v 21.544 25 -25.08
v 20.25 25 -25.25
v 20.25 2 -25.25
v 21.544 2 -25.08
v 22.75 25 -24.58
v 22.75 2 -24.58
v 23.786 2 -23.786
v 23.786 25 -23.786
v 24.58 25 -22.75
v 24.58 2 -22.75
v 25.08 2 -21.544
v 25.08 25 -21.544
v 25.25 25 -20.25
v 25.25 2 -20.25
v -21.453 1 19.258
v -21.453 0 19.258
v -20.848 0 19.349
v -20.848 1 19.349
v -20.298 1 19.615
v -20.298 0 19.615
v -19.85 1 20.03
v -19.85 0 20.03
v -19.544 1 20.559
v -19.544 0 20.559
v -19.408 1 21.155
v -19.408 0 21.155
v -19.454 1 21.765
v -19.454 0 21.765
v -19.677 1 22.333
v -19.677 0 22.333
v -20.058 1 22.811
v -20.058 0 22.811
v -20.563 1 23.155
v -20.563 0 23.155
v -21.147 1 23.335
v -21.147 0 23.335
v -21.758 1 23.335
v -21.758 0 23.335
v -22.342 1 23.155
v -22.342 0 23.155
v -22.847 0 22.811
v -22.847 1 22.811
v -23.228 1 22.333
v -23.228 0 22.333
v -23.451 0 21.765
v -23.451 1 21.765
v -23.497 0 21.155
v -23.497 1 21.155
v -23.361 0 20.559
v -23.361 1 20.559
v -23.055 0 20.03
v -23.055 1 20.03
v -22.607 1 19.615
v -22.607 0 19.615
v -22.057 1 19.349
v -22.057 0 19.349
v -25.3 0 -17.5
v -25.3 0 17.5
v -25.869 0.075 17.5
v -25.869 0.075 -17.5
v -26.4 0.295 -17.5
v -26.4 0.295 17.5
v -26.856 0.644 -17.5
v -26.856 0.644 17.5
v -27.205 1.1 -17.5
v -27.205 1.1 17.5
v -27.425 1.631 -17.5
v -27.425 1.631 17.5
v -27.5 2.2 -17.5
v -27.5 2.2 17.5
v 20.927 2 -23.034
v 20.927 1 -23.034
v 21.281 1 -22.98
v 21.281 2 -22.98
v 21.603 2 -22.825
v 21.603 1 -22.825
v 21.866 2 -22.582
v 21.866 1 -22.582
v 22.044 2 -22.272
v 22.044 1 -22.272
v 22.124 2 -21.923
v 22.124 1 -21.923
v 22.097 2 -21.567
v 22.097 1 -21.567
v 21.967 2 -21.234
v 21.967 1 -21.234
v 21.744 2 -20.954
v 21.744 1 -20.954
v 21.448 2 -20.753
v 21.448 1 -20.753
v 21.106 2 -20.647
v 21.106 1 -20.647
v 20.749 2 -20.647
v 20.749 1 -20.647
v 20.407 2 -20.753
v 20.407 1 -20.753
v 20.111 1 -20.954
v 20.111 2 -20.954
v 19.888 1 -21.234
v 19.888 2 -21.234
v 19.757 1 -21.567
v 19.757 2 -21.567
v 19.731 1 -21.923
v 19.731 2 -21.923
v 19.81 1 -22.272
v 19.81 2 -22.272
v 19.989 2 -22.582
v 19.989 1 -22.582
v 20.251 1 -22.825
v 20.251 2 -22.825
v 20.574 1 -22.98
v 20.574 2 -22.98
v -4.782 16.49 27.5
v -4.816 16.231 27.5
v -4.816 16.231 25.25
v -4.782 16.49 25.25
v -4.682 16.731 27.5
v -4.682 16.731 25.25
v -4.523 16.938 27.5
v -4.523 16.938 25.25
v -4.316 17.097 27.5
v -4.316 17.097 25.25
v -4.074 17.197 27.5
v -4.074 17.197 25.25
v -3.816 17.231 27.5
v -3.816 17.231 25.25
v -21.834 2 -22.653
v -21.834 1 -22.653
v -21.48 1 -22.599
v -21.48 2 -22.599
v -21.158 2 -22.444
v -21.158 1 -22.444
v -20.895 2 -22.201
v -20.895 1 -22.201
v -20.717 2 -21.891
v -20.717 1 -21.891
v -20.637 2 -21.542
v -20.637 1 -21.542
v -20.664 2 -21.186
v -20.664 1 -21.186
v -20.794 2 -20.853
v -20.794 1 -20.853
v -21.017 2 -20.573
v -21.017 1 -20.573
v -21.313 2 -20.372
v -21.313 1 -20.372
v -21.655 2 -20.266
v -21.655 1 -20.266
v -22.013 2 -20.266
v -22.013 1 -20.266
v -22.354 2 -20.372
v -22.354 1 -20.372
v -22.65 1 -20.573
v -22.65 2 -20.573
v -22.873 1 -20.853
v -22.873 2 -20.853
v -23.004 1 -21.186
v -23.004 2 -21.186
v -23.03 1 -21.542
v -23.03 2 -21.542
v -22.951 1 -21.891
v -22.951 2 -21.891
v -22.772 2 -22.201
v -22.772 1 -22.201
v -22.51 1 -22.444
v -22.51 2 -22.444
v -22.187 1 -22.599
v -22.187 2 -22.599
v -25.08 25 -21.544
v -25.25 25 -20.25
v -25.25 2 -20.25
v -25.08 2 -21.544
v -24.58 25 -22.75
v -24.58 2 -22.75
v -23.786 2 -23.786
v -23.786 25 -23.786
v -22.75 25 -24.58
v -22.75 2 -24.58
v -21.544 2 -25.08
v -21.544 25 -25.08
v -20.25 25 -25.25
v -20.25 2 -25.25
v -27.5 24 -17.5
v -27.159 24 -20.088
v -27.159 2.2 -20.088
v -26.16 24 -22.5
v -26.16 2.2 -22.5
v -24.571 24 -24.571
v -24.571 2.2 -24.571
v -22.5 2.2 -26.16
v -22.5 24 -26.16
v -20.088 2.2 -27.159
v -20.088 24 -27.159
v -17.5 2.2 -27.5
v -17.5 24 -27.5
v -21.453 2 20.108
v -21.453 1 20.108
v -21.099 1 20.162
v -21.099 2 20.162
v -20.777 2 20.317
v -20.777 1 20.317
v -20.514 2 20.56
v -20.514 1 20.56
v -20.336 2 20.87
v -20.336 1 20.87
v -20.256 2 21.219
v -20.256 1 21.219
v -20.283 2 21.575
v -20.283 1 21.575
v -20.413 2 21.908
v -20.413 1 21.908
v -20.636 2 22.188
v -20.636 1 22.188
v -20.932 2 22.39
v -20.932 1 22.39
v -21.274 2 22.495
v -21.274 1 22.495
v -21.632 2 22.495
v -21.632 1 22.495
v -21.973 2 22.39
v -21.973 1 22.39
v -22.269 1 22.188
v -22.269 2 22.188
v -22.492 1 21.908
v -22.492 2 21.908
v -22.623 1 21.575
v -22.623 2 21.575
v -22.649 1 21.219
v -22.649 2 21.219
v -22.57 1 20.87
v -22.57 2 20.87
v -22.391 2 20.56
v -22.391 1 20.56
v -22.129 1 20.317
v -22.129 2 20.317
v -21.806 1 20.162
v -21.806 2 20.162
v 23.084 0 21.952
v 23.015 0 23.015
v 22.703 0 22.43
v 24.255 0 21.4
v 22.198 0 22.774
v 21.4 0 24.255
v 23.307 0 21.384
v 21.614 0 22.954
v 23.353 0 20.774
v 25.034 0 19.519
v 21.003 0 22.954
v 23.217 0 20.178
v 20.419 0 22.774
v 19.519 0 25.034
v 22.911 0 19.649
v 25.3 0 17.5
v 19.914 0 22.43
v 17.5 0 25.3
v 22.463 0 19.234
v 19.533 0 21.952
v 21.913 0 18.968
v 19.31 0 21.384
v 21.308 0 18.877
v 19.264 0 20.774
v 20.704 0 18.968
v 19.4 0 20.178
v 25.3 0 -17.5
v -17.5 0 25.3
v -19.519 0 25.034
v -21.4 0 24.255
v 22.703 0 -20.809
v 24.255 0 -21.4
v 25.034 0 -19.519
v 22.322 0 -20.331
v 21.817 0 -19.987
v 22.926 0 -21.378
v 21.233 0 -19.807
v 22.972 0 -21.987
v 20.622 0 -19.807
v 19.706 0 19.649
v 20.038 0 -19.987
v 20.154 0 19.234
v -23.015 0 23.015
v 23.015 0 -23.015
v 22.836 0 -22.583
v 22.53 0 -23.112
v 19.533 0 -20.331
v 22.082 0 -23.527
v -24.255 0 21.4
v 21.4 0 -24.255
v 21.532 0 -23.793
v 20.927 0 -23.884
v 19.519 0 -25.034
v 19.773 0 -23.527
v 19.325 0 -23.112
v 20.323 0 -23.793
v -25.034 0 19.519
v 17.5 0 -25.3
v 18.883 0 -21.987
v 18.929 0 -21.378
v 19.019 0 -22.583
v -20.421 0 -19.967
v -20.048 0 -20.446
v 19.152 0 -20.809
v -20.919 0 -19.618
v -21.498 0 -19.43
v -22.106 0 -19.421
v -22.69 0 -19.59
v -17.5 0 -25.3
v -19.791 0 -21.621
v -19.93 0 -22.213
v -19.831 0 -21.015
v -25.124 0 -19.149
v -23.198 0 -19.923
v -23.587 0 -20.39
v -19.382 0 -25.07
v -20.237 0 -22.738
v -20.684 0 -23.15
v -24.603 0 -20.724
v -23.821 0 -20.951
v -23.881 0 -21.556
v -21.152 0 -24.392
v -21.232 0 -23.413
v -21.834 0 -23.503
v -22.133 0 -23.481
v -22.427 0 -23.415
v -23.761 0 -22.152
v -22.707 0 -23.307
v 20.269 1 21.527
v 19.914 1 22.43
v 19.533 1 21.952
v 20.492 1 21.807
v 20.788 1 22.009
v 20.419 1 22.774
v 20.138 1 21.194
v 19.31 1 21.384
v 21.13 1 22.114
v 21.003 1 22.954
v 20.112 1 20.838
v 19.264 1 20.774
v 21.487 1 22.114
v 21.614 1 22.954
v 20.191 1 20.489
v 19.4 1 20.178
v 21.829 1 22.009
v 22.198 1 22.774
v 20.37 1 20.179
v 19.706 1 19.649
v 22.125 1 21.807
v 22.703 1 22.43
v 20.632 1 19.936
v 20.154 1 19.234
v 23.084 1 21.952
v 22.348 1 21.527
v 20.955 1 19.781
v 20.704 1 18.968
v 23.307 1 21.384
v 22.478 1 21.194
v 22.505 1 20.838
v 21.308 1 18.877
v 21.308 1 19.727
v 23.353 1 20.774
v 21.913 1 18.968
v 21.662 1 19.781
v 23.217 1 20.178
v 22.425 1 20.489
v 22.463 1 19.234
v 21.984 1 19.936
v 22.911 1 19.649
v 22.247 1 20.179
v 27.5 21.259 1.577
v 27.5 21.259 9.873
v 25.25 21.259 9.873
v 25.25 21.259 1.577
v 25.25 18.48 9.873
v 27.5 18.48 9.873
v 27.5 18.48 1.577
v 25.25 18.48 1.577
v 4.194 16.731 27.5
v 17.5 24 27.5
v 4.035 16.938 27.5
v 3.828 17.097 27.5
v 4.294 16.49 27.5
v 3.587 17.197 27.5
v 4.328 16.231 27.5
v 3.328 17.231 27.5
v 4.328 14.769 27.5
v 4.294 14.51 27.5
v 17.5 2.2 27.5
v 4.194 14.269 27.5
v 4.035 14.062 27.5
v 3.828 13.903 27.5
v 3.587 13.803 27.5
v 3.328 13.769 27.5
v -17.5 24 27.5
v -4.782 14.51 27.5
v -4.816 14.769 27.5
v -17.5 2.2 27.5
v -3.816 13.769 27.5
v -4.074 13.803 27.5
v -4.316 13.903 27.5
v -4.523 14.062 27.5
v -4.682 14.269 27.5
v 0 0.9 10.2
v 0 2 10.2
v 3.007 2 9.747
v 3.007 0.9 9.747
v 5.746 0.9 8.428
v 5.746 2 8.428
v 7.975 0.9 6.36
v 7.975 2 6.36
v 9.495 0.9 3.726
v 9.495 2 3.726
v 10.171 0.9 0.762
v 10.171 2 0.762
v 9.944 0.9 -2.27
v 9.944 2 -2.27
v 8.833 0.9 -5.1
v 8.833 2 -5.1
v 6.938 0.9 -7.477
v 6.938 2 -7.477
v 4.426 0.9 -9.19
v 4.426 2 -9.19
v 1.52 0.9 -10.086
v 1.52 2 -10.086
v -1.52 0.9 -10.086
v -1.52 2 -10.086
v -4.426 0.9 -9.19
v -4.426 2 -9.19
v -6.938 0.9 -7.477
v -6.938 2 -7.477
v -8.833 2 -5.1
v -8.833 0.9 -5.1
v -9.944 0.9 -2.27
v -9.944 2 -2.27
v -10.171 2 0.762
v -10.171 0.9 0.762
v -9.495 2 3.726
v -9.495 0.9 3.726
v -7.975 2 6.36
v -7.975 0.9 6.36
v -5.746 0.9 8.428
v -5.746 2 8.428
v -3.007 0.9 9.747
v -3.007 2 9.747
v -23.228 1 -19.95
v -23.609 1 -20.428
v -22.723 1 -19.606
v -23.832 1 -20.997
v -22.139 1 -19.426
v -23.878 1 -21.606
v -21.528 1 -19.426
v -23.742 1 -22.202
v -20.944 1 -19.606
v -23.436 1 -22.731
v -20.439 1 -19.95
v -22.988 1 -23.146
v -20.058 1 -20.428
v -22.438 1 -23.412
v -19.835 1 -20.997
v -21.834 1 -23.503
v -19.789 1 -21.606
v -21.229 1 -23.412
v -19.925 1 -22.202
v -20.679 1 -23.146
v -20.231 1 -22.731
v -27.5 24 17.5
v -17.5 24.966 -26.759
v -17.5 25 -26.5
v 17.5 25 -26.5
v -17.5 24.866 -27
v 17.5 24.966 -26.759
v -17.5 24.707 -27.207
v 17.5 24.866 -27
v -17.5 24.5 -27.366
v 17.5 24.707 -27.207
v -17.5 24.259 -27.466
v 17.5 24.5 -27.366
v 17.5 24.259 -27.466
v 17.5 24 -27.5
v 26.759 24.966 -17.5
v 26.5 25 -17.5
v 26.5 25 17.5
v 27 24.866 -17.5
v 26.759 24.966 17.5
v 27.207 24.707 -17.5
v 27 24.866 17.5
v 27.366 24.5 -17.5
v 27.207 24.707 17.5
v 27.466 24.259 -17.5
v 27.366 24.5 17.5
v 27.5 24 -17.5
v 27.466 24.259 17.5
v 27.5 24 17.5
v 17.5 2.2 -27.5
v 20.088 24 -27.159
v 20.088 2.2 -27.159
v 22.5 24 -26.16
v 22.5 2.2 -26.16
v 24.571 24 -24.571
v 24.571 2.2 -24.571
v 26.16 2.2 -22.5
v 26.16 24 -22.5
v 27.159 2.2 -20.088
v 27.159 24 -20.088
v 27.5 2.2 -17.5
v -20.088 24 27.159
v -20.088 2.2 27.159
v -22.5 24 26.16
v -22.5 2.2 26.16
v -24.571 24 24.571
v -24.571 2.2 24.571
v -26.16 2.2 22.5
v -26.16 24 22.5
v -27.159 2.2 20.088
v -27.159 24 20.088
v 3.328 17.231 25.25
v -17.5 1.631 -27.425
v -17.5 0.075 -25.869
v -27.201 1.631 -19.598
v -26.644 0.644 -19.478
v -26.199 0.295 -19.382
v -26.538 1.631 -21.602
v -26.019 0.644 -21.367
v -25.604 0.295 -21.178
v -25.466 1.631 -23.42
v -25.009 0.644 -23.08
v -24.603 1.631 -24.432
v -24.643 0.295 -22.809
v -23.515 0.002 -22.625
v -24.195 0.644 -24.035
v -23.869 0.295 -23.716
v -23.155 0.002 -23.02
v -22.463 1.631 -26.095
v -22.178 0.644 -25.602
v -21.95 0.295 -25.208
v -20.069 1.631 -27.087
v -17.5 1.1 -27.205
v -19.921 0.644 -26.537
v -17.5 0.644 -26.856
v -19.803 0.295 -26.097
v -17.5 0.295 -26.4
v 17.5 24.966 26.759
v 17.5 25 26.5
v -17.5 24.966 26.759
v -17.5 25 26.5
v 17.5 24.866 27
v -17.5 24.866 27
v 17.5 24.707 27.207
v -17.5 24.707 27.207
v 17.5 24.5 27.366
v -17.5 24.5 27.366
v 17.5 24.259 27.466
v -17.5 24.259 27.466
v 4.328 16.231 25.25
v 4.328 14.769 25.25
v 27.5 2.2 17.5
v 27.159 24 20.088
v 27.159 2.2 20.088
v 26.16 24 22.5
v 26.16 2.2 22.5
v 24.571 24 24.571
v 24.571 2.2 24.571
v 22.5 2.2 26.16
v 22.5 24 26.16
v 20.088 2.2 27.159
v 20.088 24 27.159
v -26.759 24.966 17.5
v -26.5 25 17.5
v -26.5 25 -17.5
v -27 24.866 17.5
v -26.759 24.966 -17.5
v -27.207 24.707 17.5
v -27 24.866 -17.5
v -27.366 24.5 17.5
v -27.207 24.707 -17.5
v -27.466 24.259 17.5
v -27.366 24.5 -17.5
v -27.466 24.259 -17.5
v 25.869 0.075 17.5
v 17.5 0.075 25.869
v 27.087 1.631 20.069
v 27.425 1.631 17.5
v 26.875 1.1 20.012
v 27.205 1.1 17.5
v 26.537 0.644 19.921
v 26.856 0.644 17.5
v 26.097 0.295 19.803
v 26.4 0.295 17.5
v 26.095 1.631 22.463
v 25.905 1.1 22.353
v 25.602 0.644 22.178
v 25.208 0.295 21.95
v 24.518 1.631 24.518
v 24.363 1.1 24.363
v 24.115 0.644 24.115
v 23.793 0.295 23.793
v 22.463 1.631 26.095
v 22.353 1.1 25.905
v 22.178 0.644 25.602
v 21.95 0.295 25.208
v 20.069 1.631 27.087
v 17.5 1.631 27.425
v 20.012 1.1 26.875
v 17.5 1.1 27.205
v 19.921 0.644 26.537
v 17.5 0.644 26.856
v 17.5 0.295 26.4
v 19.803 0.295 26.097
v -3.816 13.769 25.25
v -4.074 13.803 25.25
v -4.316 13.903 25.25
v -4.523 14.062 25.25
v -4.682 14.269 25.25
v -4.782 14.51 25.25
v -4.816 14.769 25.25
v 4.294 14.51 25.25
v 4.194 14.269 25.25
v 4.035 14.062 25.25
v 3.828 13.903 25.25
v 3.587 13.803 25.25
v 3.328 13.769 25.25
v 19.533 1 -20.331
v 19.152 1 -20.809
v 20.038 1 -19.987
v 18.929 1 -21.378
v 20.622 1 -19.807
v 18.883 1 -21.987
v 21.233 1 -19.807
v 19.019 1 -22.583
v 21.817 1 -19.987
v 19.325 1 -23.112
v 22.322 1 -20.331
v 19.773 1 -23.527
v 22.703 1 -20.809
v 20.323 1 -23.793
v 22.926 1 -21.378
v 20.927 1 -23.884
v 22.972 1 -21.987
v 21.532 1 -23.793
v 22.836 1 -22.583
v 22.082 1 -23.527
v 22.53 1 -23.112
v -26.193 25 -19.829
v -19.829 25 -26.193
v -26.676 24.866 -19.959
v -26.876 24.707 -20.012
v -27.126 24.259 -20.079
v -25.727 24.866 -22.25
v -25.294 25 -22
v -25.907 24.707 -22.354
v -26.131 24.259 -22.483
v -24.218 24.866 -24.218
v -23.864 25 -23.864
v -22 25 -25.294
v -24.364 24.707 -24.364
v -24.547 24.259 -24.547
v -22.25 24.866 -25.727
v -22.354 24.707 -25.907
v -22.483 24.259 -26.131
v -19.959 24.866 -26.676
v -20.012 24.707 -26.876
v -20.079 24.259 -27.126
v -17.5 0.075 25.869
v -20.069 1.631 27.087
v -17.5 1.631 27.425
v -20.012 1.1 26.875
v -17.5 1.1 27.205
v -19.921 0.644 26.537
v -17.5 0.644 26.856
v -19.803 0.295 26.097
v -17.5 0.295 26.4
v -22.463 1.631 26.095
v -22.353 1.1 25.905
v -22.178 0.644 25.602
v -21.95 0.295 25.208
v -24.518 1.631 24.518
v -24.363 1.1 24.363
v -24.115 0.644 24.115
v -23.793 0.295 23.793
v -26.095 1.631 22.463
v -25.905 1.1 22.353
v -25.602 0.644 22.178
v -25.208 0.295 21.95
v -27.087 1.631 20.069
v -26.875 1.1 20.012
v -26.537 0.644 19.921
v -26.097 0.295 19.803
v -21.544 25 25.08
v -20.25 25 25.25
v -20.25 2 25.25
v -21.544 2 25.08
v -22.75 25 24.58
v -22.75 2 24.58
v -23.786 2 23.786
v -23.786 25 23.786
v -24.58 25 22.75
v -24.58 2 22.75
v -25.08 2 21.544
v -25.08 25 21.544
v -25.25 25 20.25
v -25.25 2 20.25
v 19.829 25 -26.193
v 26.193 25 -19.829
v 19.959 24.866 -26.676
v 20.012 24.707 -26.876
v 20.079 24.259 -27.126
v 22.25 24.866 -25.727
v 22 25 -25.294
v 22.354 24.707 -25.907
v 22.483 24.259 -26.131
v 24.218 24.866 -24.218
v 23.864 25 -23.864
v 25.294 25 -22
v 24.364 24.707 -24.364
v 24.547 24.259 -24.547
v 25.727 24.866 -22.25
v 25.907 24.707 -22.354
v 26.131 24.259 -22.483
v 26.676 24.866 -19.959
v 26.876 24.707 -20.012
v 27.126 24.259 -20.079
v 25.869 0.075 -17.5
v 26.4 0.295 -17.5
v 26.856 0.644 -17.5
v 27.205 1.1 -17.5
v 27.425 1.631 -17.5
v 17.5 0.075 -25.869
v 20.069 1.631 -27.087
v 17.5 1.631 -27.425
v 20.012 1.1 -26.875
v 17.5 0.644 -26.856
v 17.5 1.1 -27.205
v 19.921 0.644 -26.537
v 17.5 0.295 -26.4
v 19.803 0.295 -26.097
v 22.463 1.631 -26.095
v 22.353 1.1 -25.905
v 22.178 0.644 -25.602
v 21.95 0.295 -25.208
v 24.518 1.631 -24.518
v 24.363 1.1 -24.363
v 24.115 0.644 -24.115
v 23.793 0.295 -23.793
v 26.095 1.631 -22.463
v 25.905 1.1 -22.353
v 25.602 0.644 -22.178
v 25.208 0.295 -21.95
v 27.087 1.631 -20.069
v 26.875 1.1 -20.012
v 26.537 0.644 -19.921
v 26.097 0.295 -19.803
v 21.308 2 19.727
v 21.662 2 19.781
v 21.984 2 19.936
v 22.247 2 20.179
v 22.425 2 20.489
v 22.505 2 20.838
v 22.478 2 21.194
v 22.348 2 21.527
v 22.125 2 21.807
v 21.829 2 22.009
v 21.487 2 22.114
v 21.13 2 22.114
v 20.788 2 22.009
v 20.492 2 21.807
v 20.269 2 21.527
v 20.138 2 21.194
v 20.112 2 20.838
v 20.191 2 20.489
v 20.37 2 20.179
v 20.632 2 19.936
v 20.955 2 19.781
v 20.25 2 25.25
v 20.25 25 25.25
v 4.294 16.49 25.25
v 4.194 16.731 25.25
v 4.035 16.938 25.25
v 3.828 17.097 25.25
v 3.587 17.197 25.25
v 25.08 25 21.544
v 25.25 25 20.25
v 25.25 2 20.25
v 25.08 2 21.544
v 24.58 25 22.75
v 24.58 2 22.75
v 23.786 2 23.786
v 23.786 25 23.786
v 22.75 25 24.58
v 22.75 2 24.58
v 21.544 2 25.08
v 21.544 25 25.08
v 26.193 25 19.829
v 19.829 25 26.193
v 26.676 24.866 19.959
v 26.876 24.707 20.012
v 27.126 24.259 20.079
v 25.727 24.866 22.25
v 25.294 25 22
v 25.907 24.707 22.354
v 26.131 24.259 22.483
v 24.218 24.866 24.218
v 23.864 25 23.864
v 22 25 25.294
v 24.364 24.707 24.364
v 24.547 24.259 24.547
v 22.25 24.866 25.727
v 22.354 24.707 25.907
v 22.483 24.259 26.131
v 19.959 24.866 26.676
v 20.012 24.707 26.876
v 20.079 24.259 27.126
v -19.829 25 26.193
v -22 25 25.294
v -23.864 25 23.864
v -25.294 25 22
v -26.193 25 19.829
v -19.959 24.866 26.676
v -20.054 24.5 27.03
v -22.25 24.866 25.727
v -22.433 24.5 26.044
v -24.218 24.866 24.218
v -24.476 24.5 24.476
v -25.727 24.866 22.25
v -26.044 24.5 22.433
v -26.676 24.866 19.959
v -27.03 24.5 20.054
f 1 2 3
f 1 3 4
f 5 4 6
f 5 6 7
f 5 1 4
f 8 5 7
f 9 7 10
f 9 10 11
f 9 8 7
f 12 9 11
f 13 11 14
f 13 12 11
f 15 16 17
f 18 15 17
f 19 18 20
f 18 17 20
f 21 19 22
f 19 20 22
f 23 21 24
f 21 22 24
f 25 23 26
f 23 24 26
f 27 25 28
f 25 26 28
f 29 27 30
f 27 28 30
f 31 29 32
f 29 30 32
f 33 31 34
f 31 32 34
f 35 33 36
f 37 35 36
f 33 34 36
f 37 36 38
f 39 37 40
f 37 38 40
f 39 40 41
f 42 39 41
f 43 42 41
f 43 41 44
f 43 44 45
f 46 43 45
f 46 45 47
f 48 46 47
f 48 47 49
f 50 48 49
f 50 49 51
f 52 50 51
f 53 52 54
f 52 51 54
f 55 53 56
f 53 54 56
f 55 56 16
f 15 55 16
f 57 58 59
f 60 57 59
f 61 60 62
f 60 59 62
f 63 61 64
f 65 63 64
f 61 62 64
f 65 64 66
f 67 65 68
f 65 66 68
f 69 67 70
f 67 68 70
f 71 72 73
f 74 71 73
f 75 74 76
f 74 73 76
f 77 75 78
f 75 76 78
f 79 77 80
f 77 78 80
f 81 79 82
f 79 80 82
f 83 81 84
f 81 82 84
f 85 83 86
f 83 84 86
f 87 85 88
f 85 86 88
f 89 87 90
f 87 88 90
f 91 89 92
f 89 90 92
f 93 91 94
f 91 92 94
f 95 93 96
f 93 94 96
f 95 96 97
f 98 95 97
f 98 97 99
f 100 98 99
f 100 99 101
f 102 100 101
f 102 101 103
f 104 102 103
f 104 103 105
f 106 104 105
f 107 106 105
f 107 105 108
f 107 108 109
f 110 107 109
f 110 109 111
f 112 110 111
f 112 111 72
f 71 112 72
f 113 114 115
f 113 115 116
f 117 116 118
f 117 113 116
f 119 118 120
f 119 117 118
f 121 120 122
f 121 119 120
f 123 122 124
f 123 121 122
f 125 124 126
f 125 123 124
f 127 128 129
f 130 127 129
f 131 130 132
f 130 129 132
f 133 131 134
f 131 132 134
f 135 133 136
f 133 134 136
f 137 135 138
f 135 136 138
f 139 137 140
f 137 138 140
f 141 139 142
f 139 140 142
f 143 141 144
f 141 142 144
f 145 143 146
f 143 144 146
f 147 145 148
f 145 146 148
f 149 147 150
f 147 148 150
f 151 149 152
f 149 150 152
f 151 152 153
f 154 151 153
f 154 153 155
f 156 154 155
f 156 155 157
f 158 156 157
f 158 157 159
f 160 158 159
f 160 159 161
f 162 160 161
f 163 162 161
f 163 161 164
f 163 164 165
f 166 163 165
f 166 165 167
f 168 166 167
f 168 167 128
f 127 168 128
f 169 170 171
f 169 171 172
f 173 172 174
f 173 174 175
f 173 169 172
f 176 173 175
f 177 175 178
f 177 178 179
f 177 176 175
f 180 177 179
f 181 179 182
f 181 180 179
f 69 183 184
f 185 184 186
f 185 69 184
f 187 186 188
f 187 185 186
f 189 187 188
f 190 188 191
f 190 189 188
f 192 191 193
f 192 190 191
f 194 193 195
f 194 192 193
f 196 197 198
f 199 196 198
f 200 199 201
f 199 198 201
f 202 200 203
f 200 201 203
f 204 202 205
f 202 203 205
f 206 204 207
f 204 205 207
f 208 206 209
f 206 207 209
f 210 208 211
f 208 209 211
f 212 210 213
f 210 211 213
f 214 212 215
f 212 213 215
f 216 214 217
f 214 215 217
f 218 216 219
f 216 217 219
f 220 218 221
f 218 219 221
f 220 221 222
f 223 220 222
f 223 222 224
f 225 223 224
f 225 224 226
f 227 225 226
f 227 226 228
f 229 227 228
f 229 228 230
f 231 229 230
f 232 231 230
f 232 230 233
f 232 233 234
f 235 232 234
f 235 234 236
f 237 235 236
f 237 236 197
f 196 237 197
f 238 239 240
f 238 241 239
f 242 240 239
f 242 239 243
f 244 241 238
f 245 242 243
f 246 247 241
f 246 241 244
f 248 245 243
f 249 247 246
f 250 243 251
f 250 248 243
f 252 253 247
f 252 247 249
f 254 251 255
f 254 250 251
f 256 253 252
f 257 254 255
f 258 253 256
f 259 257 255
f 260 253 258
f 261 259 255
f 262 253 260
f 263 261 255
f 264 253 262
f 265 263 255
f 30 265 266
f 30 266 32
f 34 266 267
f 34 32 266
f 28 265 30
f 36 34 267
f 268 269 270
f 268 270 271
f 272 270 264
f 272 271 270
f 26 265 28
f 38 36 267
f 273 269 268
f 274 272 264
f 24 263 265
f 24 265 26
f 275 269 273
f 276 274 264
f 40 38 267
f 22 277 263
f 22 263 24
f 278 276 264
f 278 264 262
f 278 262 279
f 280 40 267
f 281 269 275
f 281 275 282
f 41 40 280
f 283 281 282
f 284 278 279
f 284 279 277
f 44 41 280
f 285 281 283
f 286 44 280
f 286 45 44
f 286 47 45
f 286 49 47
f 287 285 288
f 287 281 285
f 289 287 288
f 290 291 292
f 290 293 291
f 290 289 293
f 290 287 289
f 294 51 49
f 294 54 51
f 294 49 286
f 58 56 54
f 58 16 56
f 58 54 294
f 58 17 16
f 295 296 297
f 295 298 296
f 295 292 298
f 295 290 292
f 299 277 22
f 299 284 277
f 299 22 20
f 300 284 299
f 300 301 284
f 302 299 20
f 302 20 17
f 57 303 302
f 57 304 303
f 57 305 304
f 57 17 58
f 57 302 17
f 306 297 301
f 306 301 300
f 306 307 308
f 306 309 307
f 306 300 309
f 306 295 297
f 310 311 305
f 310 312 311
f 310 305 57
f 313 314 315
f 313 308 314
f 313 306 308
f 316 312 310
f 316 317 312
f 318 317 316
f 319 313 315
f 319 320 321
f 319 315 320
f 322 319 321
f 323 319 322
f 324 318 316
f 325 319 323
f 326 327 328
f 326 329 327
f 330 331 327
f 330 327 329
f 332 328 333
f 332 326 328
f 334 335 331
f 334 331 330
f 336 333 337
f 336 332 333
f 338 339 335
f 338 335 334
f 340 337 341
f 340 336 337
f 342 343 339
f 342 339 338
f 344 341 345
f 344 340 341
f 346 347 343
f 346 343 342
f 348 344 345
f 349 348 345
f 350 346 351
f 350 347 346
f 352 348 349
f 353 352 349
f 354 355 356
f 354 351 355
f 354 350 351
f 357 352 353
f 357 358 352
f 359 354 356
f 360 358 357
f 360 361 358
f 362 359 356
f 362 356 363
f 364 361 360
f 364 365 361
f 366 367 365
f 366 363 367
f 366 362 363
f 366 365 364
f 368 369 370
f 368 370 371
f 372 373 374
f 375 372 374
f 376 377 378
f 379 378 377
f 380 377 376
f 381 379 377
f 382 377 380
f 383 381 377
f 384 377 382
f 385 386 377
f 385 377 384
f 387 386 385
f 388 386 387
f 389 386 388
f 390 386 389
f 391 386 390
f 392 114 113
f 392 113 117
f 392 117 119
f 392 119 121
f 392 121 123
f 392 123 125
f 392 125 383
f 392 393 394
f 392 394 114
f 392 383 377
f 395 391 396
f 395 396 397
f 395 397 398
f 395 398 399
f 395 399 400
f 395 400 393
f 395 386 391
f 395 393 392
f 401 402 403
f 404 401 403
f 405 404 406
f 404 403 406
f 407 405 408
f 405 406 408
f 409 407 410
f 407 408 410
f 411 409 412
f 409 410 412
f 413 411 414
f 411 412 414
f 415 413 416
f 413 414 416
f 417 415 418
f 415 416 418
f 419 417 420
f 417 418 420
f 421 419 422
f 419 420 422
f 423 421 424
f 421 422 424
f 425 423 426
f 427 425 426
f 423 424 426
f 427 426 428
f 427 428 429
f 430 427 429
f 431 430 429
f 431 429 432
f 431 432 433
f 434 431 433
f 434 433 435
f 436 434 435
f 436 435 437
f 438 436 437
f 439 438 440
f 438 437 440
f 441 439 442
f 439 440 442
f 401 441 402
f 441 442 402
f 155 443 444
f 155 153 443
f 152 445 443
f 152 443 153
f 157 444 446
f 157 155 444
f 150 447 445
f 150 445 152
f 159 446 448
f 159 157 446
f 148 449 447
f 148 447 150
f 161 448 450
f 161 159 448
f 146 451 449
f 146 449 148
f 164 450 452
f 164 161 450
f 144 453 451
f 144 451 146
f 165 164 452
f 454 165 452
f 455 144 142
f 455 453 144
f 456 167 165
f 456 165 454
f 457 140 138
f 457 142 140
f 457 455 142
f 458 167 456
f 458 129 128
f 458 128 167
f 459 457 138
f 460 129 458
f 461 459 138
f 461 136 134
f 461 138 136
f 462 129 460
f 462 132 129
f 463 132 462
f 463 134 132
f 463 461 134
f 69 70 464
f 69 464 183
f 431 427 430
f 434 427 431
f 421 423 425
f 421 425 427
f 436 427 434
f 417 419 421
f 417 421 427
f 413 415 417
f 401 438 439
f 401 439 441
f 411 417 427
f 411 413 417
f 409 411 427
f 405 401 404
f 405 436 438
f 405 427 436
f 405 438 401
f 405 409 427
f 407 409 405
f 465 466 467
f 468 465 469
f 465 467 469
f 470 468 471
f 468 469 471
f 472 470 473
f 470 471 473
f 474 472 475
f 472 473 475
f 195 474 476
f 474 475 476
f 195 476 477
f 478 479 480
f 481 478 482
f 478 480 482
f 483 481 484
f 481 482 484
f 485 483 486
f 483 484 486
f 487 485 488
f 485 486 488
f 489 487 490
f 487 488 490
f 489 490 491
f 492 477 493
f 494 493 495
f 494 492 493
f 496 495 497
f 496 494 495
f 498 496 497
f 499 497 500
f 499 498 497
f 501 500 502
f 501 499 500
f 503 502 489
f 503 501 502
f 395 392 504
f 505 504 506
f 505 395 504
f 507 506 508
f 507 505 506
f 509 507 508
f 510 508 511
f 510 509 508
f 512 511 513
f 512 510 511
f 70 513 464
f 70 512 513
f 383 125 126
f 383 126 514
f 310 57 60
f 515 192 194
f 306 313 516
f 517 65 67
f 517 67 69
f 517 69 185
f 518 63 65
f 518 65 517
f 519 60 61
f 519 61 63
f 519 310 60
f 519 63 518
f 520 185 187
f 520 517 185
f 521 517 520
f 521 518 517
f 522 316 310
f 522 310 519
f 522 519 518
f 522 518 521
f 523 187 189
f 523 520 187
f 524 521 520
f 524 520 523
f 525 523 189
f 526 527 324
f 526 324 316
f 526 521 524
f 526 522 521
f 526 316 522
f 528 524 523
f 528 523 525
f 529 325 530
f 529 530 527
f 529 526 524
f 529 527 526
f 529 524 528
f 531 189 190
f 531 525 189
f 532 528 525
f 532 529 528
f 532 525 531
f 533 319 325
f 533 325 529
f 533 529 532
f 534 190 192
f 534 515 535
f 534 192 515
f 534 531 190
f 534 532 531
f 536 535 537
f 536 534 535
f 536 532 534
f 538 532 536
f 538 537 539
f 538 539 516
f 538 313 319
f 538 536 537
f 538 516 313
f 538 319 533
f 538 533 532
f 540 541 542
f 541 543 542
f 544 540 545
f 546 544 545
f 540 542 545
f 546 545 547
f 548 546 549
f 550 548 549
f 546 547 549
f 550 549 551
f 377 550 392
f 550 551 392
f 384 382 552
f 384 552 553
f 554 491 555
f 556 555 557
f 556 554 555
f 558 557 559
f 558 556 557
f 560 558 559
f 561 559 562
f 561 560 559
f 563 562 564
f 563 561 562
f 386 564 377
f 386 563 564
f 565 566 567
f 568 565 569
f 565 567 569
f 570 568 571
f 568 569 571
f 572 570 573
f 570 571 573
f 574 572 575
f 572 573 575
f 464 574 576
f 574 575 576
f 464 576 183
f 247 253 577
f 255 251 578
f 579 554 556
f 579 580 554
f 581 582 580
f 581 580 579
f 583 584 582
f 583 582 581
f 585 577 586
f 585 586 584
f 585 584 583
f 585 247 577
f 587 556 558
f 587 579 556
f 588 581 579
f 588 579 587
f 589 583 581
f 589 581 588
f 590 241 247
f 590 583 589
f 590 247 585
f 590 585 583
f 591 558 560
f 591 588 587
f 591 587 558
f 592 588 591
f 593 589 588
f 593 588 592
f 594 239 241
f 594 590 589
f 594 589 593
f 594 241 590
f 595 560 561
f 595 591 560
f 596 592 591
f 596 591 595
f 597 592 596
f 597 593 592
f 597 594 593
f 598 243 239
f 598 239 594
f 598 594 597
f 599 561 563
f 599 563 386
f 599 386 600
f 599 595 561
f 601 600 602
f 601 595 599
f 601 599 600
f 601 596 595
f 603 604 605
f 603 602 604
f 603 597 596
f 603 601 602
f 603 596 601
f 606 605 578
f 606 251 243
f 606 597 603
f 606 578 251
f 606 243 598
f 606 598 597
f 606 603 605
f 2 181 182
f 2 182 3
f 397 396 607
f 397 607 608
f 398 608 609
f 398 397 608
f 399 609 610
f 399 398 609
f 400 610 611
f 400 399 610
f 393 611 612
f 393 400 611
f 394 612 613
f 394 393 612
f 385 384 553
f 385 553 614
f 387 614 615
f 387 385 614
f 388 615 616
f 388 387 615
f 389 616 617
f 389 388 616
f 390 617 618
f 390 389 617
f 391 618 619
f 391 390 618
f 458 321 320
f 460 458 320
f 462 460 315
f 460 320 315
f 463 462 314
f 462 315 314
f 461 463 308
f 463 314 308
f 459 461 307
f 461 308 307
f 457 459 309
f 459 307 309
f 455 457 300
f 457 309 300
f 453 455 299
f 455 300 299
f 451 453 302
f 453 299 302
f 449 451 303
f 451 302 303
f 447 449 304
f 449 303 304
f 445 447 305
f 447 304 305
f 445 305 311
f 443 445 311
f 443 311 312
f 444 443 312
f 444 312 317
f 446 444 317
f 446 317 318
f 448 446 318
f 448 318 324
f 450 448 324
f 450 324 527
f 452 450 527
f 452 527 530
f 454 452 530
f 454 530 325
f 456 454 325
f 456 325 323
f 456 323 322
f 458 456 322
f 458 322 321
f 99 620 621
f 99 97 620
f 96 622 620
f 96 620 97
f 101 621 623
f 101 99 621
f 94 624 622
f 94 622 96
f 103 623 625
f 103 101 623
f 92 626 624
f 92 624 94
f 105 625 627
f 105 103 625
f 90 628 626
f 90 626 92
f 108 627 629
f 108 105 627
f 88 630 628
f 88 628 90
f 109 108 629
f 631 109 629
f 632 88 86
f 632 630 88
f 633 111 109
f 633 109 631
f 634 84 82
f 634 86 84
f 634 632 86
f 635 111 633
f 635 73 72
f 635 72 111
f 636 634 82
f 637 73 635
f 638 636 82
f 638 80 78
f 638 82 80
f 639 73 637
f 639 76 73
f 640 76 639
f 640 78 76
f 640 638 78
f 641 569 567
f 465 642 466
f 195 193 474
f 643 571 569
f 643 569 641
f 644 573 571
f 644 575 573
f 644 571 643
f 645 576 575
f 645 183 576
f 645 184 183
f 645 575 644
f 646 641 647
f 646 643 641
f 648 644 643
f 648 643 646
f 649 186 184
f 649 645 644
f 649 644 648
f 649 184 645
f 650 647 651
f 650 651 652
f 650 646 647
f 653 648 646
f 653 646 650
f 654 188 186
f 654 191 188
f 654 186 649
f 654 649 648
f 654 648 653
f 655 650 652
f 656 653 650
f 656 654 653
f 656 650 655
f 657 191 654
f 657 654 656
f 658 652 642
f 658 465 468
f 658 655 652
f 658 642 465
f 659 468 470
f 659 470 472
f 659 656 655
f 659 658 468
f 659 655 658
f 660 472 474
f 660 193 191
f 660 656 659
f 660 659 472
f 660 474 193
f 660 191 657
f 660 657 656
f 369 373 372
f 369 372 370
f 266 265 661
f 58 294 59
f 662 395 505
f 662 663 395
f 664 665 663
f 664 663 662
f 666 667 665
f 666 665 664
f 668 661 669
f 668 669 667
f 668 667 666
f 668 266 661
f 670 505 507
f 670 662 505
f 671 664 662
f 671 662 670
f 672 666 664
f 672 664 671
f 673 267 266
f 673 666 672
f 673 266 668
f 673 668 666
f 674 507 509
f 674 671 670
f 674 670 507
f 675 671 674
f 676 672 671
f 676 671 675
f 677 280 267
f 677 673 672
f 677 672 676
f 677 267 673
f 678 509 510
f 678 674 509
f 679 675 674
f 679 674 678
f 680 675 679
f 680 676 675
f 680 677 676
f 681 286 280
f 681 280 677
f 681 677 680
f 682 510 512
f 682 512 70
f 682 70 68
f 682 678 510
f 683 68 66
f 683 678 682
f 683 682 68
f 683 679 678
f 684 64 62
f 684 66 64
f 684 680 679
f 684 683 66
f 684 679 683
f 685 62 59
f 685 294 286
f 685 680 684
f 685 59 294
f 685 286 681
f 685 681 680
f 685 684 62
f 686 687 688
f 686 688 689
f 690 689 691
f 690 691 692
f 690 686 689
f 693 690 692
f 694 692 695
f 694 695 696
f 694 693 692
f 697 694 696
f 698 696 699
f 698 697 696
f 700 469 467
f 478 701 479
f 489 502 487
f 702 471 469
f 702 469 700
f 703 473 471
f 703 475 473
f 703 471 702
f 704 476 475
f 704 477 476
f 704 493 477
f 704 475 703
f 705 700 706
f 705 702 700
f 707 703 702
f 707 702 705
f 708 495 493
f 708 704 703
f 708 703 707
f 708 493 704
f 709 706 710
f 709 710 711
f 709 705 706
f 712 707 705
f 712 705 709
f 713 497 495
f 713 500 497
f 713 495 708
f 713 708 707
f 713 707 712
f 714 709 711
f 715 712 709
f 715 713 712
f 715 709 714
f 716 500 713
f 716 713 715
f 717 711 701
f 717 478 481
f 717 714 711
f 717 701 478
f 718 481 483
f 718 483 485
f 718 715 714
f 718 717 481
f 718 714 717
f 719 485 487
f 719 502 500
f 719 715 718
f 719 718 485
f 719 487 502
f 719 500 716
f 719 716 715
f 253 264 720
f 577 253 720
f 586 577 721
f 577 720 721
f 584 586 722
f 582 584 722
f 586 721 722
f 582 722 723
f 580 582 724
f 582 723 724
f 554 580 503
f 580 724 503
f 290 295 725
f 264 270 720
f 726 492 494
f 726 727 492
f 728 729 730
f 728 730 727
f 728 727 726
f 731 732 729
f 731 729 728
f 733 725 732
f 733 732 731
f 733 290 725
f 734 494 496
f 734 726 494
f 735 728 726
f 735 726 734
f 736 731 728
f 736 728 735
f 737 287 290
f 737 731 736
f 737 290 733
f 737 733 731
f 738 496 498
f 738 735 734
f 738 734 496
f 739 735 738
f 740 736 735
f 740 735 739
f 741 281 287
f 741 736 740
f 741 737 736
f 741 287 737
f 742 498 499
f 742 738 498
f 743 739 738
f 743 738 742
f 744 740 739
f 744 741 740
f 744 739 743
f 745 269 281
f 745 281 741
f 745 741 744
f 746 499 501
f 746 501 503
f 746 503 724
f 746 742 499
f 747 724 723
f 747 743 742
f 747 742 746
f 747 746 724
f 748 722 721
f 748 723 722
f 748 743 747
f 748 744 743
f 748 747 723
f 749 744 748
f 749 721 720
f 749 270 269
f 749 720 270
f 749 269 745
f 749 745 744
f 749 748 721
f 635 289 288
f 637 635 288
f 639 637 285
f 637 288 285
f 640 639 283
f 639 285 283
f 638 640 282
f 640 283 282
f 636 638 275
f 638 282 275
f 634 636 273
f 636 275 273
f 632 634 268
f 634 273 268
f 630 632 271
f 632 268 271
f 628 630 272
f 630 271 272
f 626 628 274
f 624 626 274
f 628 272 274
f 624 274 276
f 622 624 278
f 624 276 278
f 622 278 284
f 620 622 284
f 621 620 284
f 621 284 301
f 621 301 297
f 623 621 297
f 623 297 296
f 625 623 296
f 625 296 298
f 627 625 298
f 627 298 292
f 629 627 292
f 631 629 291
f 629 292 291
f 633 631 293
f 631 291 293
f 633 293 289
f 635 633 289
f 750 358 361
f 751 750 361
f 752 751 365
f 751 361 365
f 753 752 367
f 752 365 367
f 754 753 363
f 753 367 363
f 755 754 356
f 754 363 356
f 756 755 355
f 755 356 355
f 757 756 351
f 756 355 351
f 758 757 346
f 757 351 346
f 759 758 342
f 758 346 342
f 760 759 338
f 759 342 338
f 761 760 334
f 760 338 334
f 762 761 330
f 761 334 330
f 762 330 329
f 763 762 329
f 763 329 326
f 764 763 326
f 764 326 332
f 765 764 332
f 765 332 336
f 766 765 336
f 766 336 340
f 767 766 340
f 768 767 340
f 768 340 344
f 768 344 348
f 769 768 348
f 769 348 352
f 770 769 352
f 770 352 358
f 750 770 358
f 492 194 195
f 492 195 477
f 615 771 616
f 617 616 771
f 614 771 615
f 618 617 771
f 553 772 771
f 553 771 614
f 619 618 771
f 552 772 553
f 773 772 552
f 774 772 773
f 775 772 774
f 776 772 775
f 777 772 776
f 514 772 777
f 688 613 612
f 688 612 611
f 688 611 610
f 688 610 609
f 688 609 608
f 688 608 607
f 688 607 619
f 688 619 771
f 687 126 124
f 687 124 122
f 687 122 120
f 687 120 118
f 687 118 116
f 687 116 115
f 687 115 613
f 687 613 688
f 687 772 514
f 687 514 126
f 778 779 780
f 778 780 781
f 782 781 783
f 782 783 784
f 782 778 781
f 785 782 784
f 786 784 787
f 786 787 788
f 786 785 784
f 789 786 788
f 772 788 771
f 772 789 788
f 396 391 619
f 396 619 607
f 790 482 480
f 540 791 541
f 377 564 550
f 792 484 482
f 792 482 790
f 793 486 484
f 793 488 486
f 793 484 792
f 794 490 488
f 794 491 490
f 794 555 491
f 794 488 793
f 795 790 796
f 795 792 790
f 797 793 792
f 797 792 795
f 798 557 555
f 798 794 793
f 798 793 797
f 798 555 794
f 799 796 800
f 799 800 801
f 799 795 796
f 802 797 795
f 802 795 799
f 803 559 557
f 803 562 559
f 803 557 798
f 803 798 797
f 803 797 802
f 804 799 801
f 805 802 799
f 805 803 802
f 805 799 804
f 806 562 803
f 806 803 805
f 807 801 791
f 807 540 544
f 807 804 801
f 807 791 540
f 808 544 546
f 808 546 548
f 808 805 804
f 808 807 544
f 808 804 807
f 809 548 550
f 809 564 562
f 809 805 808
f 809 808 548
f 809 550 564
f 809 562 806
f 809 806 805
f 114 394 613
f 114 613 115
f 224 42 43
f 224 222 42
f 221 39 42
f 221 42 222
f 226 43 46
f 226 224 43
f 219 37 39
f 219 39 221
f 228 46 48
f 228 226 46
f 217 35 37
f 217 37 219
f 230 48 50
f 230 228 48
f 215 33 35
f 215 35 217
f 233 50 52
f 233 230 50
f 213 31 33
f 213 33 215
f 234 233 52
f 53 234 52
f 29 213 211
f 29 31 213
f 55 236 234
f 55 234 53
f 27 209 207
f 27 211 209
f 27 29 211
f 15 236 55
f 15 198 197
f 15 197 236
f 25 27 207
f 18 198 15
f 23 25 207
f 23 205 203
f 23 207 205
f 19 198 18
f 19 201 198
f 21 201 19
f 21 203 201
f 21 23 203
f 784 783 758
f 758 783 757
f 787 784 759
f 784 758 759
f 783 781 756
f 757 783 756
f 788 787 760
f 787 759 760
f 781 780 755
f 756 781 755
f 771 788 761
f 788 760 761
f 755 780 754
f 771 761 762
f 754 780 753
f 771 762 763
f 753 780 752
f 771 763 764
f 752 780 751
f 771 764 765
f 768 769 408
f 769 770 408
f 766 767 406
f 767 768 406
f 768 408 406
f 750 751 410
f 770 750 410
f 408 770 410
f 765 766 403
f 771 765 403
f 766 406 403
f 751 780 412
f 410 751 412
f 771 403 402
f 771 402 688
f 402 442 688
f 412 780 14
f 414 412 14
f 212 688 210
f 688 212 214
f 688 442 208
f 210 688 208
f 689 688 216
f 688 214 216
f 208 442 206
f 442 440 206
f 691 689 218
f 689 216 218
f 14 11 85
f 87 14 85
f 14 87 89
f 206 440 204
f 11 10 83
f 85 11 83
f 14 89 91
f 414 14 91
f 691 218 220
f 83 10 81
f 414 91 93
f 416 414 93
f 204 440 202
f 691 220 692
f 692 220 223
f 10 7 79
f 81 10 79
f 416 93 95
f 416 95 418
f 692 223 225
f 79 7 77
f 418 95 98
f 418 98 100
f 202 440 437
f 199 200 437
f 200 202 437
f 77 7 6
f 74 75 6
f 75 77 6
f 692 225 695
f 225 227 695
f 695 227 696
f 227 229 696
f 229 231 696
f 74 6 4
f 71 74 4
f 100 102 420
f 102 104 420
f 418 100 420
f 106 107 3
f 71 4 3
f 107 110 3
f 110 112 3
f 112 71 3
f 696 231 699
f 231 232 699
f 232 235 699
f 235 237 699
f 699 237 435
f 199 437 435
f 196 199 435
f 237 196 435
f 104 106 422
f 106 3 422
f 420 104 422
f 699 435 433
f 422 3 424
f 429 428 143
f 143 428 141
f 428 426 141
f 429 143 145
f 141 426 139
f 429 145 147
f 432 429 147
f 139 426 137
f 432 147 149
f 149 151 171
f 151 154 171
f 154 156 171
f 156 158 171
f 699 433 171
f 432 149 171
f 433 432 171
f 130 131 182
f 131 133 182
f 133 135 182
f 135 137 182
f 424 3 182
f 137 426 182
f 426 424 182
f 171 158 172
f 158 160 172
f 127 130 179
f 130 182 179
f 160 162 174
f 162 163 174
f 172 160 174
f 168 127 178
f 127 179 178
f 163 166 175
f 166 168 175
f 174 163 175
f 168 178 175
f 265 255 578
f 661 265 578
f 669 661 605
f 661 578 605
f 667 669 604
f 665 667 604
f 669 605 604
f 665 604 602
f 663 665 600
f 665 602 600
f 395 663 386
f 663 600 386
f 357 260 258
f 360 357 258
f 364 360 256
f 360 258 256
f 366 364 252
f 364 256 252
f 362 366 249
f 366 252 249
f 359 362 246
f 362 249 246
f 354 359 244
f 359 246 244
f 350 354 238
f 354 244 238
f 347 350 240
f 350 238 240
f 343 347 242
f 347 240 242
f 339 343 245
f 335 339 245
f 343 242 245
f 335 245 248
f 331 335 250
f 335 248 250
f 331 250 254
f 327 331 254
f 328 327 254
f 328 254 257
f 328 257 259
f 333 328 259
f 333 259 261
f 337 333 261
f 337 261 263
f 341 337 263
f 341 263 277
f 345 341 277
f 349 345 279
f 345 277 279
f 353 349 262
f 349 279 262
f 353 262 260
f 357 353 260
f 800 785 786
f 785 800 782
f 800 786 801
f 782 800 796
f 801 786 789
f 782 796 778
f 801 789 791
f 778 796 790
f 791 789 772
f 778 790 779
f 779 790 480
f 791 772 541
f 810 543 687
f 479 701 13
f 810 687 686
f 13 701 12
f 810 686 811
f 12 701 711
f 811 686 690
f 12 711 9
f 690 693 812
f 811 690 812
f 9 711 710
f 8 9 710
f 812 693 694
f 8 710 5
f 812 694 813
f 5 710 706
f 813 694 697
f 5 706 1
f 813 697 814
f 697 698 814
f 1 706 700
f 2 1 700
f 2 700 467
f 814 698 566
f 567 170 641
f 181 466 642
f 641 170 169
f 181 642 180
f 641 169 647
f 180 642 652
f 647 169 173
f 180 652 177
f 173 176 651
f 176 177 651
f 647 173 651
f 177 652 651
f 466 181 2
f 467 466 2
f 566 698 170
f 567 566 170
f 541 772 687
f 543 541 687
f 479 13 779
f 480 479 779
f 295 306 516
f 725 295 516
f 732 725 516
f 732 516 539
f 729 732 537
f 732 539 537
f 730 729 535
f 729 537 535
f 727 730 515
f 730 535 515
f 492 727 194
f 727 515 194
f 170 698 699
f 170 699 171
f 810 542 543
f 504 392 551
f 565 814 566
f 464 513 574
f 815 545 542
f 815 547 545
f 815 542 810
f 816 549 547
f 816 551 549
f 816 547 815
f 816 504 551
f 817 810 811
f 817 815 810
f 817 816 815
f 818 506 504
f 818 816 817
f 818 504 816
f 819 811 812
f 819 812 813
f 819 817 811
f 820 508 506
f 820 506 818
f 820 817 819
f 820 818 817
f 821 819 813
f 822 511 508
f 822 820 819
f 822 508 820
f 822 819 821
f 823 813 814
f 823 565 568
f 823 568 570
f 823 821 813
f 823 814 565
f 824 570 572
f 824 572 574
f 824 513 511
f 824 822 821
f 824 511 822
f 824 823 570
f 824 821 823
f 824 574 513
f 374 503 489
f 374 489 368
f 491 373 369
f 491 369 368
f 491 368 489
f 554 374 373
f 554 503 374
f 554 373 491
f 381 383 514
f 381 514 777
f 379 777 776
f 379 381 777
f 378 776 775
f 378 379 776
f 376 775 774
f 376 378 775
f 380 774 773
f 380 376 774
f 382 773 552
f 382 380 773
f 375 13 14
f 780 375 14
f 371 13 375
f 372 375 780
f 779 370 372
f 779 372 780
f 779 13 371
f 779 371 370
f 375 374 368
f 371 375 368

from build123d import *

# Parameters (mm, degrees)
EXTRUDE_2_DEPTH      = 25
CUT_EXTRUDE_1_DEPTH  = 23
SKETCH_4_R           = 1.2
CUT_EXTRUDE_2_DEPTH  = 10
SKETCH_5_R           = 2.05
CUT_EXTRUDE_3_DEPTH  = 1
CUT_EXTRUDE_4_DEPTH  = 8
SKETCH_8_W           = 8.296155167
SKETCH_8_H           = 2.779340605
CUT_EXTRUDE_9_DEPTH  = 8
SKETCH_11_R          = 10.2
CUT_EXTRUDE_11_DEPTH = 1.1
FILLET_3_R           = 2.2
FILLET_4_R           = 1


with BuildPart() as part:
    # 草图1 → 凸台-拉伸2 (new body)
    with BuildSketch(Plane(origin=(0, 0, 0), x_dir=(1, 0, 0), z_dir=(0, 1, 0))):
        with BuildLine():
            Line((-17.5, 27.5), (17.5, 27.5))
            ThreePointArc((17.5, 27.5), (24.571067812, 24.571067812), (27.5, 17.5))
            Line((27.5, 17.5), (27.5, -17.5))
            ThreePointArc((27.5, -17.5), (24.571067812, -24.571067812), (17.5, -27.5))
            Line((17.5, -27.5), (-17.5, -27.5))
            ThreePointArc((-17.5, -27.5), (-24.571067812, -24.571067812), (-27.5, -17.5))
            Line((-27.5, -17.5), (-27.5, 17.5))
            ThreePointArc((-27.5, 17.5), (-24.571067812, 24.571067812), (-17.5, 27.5))
        make_face()
    extrude(amount=EXTRUDE_2_DEPTH)

    # 草图3 → 切除-拉伸1 (cut)
    with BuildSketch(Plane(origin=(0, 25, 0), x_dir=(1, 0, 0), z_dir=(0, 1, 0))):
        with BuildLine():
            Line((-20.25, 25.25), (20.25, 25.25))
            ThreePointArc((20.25, 25.25), (23.785533906, 23.785533906), (25.25, 20.25))
            Line((25.25, 20.25), (25.25, -20.25))
            ThreePointArc((25.25, -20.25), (23.785533906, -23.785533906), (20.25, -25.25))
            Line((20.25, -25.25), (-20.25, -25.25))
            ThreePointArc((-20.25, -25.25), (-23.785533906, -23.785533906), (-25.25, -20.25))
            Line((-25.25, -20.25), (-25.25, 20.25))
            ThreePointArc((-25.25, 20.25), (-23.785533906, 23.785533906), (-20.25, 25.25))
        make_face()
    extrude(amount=-CUT_EXTRUDE_1_DEPTH, mode=Mode.SUBTRACT)

    # 草图4 → 切除-拉伸2 (cut)
    with BuildSketch(Plane.XZ):
        with Locations(Location((-21.452692405, 21.308392177, 0), (0, 0, 270))):
            Circle(SKETCH_4_R)
        with Locations(Location((21.308392177, 20.927391415, 0), (0, 0, 270))):
            Circle(SKETCH_4_R)
        with Locations(Location((-21.833693167, -21.452692405, 0), (0, 0, 270))):
            Circle(SKETCH_4_R)
        with Locations(Location((20.927391415, -21.833693167, 0), (0, 0, 270))):
            Circle(SKETCH_4_R)
    extrude(amount=-CUT_EXTRUDE_2_DEPTH, mode=Mode.SUBTRACT)

    # 草图5 → 切除-拉伸3 (cut)
    with BuildSketch(Plane.XZ):
        with Locations(Location((-21.452692405, 21.308392177, 0), (0, 0, 270))):
            Circle(SKETCH_5_R)
        with Locations(Location((21.308392177, 20.927391415, 0), (0, 0, 270))):
            Circle(SKETCH_5_R)
        with Locations(Location((-21.833693167, -21.452692405, 0), (0, 0, 270))):
            Circle(SKETCH_5_R)
        with Locations(Location((20.927391415, -21.833693167, 0), (0, 0, 270))):
            Circle(SKETCH_5_R)
    extrude(amount=-CUT_EXTRUDE_3_DEPTH, mode=Mode.SUBTRACT)

    # 草图7 → 切除-拉伸4 (cut)
    with BuildSketch(Plane.XY.offset(27.5)):
        with BuildLine():
            Line((-3.815614102, 17.230683857), (3.328314128, 17.230683857))
            ThreePointArc((3.328314128, 17.230683857), (4.035420909, 16.937790638), (4.328314128, 16.230683857))
            Line((4.328314128, 16.230683857), (4.328314128, 14.769316156))
            ThreePointArc((4.328314128, 14.769316156), (4.035420909, 14.062209375), (3.328314128, 13.769316156))
            Line((3.328314128, 13.769316156), (-3.815614102, 13.769316156))
            ThreePointArc((-3.815614102, 13.769316156), (-4.522720884, 14.062209375), (-4.815614102, 14.769316156))
            Line((-4.815614102, 14.769316156), (-4.815614102, 16.230683857))
            ThreePointArc((-4.815614102, 16.230683857), (-4.522720884, 16.937790638), (-3.815614102, 17.230683857))
        make_face()
    extrude(amount=-CUT_EXTRUDE_4_DEPTH, mode=Mode.SUBTRACT)

    # 草图8 → 切除-拉伸9 (cut)
    with BuildSketch(Plane(origin=(27.5, 0, 0), x_dir=(0, 0, -1), z_dir=(1, 0, 0))):
        with Locations((-5.725361951, 19.869366797)):
            Rectangle(SKETCH_8_W, SKETCH_8_H)
    extrude(amount=-CUT_EXTRUDE_9_DEPTH, mode=Mode.SUBTRACT)

    # 草图11 → 切除-拉伸11 (cut)
    with BuildSketch(Plane(origin=(0, 2, 0), x_dir=(1, 0, 0), z_dir=(0, 1, 0))):
        with Locations(Location((0, 0, 0), (0, 0, 270))):
            Circle(SKETCH_11_R)
    extrude(amount=-CUT_EXTRUDE_11_DEPTH, mode=Mode.SUBTRACT)

    # 圆角3
    # the kernel refuses this fillet: 2.2 mm, written as the material it takes off along each edge
    with BuildSketch(Plane(origin=(17.5, 0, 27.5), x_dir=(0, 0, -1), z_dir=(-1, 0, 0)), Plane(origin=(-27.5, 0, 17.5), x_dir=(1, 0, 0), z_dir=(0, 0, -1)), Plane(origin=(27.5, 0, -17.5), x_dir=(-1, 0, 0), z_dir=(0, 0, 1))) as fillet_3_piece_1:
        with BuildLine():
            CenterArc((FILLET_3_R, -FILLET_3_R), FILLET_3_R, 90, 90)
            Line((0, -FILLET_3_R), (0, 0))
            Line((0, 0), (FILLET_3_R, 0))
        make_face()
    extrude(amount=35, mode=Mode.SUBTRACT)
    with BuildSketch(Plane(origin=(-17.5, 0, 17.5), x_dir=(0, 0, 1), z_dir=(1, 0, 0))) as fillet_3_piece_2:
        with BuildLine():
            CenterArc((10 - FILLET_3_R, -FILLET_3_R), FILLET_3_R, 0, 90)
            Line((10, -FILLET_3_R), (10, 0))
            Line((10, 0), (10 - FILLET_3_R, 0))
        make_face()
    revolve(axis=Axis((-17.5, 0, 17.5), (0, -1, 0)), revolution_arc=90, mode=Mode.SUBTRACT)
    with BuildSketch(Plane(origin=(-17.5, 0, -17.5), x_dir=(-1, 0, 0), z_dir=(0, 0, 1))) as fillet_3_piece_3:
        with BuildLine():
            CenterArc((10 - FILLET_3_R, -FILLET_3_R), FILLET_3_R, 0, 90)
            Line((10 - FILLET_3_R, 0), (10, 0))
            Line((10, 0), (10, -FILLET_3_R))
        make_face()
    revolve(axis=Axis((-17.5, 0, -17.5), (0, -1, 0)), revolution_arc=90, mode=Mode.SUBTRACT)
    with BuildSketch(Plane(origin=(-17.5, 0, -27.5), x_dir=(0, 1, 0), z_dir=(1, 0, 0))) as fillet_3_piece_4:
        with BuildLine():
            CenterArc((FILLET_3_R, FILLET_3_R), FILLET_3_R, 180, 90)
            Line((0, FILLET_3_R), (0, 0))
            Line((0, 0), (FILLET_3_R, 0))
        make_face()
    extrude(amount=35, mode=Mode.SUBTRACT)
    with BuildSketch(Plane(origin=(17.5, 0, -17.5), x_dir=(0, 0, -1), z_dir=(-1, 0, 0))) as fillet_3_piece_5:
        with BuildLine():
            CenterArc((10 - FILLET_3_R, -FILLET_3_R), FILLET_3_R, 0, 90)
            Line((10 - FILLET_3_R, 0), (10, 0))
            Line((10, 0), (10, -FILLET_3_R))
        make_face()
    revolve(axis=Axis((17.5, 0, -17.5), (0, -1, 0)), revolution_arc=90, mode=Mode.SUBTRACT)
    with BuildSketch(Plane(origin=(17.5, 0, 17.5), x_dir=(1, 0, 0), z_dir=(0, 0, -1))) as fillet_3_piece_6:
        with BuildLine():
            CenterArc((10 - FILLET_3_R, -FILLET_3_R), FILLET_3_R, 0, 90)
            Line((10, -FILLET_3_R), (10, 0))
            Line((10, 0), (10 - FILLET_3_R, 0))
        make_face()
    revolve(axis=Axis((17.5, 0, 17.5), (0, -1, 0)), revolution_arc=90, mode=Mode.SUBTRACT)

    # 圆角4
    fillet_4_edges = [part.edges().sort_by_distance(p)[0] for p in [
        (-24.571067812, 25, 24.571067812),
        (0, 25, 27.5),
        (24.571067812, 25, 24.571067812),
        (27.5, 25, 0),
        (24.571067812, 25, -24.571067812),
        (0, 25, -27.5),
        (-24.571067812, 25, -24.571067812),
        (-27.5, 25, 0),
    ]]
    fillet(fillet_4_edges, radius=FILLET_4_R)


solid = part.part
